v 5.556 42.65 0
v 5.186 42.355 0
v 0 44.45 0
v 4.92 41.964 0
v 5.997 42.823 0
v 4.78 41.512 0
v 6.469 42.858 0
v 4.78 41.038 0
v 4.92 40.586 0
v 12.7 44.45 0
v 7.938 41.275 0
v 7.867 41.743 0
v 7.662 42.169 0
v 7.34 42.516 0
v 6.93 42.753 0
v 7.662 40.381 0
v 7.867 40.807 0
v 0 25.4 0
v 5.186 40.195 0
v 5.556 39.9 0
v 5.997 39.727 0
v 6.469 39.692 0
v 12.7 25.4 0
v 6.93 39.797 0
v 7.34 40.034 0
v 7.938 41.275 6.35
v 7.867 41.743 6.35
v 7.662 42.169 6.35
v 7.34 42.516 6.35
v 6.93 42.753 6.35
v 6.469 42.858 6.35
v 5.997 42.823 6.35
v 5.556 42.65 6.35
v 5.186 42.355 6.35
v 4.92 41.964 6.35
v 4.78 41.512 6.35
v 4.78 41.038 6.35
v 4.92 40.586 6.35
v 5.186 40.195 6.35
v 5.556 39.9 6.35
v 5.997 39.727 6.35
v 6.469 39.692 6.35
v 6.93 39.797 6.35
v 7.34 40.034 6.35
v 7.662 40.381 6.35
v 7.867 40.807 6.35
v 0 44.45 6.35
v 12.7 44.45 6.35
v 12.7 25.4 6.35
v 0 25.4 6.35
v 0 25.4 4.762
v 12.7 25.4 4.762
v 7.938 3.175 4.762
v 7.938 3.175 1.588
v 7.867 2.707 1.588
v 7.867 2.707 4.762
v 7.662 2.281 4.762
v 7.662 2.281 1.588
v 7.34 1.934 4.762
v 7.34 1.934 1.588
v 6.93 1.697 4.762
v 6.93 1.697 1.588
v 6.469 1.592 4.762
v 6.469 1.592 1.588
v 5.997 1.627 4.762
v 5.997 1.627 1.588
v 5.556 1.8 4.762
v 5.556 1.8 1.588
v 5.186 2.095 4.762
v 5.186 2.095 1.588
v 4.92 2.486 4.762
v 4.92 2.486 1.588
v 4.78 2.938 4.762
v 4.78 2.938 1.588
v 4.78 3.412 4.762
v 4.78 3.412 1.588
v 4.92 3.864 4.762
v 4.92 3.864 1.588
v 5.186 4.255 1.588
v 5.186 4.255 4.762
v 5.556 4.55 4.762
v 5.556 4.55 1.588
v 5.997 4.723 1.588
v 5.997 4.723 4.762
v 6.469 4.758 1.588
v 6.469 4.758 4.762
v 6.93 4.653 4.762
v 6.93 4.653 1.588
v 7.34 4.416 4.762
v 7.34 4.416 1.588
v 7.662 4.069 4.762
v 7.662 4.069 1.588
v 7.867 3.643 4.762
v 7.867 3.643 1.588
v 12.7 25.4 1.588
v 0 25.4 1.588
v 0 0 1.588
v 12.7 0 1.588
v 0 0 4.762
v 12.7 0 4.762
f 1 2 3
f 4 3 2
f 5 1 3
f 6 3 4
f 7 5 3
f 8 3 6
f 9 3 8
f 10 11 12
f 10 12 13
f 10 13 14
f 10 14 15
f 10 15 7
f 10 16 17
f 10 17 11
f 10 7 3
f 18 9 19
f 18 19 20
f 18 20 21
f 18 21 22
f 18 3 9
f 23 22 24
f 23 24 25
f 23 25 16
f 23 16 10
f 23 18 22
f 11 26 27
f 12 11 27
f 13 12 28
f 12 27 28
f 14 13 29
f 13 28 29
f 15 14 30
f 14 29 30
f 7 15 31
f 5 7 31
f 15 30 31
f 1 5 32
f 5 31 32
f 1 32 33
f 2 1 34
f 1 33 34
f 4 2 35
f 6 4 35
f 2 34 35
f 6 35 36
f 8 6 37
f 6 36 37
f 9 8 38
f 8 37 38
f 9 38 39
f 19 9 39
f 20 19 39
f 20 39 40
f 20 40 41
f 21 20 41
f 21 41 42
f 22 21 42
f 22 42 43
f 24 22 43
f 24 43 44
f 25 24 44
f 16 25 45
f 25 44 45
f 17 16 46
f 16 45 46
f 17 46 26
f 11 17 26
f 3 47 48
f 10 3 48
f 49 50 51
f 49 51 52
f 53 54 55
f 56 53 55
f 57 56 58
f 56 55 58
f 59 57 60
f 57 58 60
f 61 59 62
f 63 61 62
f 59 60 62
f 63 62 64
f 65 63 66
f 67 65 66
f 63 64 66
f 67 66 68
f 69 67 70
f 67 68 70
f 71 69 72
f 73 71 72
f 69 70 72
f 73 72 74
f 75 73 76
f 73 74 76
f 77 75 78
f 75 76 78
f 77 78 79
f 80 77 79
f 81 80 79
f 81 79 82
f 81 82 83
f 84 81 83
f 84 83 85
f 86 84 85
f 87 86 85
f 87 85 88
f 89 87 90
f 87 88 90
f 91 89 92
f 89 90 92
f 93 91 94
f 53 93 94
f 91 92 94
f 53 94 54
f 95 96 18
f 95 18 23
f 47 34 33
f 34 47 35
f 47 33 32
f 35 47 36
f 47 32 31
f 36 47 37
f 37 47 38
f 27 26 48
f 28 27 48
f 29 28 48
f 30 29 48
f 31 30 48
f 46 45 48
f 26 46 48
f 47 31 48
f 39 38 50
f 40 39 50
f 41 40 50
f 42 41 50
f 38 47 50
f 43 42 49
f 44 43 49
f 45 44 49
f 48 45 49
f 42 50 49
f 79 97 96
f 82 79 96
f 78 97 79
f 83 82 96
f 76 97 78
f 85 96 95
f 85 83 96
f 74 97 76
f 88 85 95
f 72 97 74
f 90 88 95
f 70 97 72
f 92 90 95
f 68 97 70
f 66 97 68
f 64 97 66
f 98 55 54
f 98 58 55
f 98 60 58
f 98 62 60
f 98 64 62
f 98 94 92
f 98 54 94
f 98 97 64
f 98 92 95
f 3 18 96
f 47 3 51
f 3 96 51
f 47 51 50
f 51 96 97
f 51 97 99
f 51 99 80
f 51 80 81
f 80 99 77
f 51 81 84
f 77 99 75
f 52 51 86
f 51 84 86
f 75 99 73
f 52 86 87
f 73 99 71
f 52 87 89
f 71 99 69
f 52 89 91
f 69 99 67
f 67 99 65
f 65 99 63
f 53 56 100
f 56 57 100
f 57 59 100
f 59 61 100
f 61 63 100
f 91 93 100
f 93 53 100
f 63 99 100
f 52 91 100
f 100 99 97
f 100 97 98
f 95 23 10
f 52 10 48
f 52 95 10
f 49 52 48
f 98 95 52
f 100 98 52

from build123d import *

# Parameters (mm, degrees)
F0_W     = 12.7
F0_H     = 6.35
F1_DEPTH = 44.45
F2_W     = 17.78
F2_H     = 7.174791
F3_DEPTH = 6.35
F2_H_2   = 14.010797
F4_DEPTH = 25.4
F5_R     = 1.5875
F6_DEPTH = 3.175
F7_R     = 1.5875
F8_DEPTH = 6.35


with BuildPart() as f1:
    # F0 (on Front) → F1 (new body)
    with BuildSketch(Plane.XZ):
        with Locations((6.35, 3.175)):
            Rectangle(F0_W, F0_H)
    extrude(amount=-F1_DEPTH)

    # F2 (on Front) → F3 (cut)
    with BuildSketch(Plane.XZ):
        with Locations((5.08, -1.999895)):
            Rectangle(F2_W, F2_H)
    extrude(amount=-F3_DEPTH, mode=Mode.SUBTRACT)

    # F2 (on Front) → F4 (cut)
    with BuildSketch(Plane.XZ):
        with Locations((5.08, 11.767898)):
            Rectangle(F2_W, F2_H_2)
        with Locations((5.08, -1.999895)):
            Rectangle(F2_W, F2_H)
    extrude(amount=-F4_DEPTH, mode=Mode.SUBTRACT)

    # F5 (on face) → F6 (cut, through all)
    with BuildSketch(Plane(origin=(0, 0, 1.5875), x_dir=(1, 0, 0), z_dir=(0, 0, -1))):
        with Locations((6.35, -3.175)):
            Circle(F5_R)
    extrude(amount=-F6_DEPTH, mode=Mode.SUBTRACT)

    # F7 (on face) → F8 (cut, through all)
    with BuildSketch(Plane.XY.offset(6.35)):
        with Locations((6.35, 41.275)):
            Circle(F7_R)
    extrude(amount=-F8_DEPTH, mode=Mode.SUBTRACT)


solid = f1.part
